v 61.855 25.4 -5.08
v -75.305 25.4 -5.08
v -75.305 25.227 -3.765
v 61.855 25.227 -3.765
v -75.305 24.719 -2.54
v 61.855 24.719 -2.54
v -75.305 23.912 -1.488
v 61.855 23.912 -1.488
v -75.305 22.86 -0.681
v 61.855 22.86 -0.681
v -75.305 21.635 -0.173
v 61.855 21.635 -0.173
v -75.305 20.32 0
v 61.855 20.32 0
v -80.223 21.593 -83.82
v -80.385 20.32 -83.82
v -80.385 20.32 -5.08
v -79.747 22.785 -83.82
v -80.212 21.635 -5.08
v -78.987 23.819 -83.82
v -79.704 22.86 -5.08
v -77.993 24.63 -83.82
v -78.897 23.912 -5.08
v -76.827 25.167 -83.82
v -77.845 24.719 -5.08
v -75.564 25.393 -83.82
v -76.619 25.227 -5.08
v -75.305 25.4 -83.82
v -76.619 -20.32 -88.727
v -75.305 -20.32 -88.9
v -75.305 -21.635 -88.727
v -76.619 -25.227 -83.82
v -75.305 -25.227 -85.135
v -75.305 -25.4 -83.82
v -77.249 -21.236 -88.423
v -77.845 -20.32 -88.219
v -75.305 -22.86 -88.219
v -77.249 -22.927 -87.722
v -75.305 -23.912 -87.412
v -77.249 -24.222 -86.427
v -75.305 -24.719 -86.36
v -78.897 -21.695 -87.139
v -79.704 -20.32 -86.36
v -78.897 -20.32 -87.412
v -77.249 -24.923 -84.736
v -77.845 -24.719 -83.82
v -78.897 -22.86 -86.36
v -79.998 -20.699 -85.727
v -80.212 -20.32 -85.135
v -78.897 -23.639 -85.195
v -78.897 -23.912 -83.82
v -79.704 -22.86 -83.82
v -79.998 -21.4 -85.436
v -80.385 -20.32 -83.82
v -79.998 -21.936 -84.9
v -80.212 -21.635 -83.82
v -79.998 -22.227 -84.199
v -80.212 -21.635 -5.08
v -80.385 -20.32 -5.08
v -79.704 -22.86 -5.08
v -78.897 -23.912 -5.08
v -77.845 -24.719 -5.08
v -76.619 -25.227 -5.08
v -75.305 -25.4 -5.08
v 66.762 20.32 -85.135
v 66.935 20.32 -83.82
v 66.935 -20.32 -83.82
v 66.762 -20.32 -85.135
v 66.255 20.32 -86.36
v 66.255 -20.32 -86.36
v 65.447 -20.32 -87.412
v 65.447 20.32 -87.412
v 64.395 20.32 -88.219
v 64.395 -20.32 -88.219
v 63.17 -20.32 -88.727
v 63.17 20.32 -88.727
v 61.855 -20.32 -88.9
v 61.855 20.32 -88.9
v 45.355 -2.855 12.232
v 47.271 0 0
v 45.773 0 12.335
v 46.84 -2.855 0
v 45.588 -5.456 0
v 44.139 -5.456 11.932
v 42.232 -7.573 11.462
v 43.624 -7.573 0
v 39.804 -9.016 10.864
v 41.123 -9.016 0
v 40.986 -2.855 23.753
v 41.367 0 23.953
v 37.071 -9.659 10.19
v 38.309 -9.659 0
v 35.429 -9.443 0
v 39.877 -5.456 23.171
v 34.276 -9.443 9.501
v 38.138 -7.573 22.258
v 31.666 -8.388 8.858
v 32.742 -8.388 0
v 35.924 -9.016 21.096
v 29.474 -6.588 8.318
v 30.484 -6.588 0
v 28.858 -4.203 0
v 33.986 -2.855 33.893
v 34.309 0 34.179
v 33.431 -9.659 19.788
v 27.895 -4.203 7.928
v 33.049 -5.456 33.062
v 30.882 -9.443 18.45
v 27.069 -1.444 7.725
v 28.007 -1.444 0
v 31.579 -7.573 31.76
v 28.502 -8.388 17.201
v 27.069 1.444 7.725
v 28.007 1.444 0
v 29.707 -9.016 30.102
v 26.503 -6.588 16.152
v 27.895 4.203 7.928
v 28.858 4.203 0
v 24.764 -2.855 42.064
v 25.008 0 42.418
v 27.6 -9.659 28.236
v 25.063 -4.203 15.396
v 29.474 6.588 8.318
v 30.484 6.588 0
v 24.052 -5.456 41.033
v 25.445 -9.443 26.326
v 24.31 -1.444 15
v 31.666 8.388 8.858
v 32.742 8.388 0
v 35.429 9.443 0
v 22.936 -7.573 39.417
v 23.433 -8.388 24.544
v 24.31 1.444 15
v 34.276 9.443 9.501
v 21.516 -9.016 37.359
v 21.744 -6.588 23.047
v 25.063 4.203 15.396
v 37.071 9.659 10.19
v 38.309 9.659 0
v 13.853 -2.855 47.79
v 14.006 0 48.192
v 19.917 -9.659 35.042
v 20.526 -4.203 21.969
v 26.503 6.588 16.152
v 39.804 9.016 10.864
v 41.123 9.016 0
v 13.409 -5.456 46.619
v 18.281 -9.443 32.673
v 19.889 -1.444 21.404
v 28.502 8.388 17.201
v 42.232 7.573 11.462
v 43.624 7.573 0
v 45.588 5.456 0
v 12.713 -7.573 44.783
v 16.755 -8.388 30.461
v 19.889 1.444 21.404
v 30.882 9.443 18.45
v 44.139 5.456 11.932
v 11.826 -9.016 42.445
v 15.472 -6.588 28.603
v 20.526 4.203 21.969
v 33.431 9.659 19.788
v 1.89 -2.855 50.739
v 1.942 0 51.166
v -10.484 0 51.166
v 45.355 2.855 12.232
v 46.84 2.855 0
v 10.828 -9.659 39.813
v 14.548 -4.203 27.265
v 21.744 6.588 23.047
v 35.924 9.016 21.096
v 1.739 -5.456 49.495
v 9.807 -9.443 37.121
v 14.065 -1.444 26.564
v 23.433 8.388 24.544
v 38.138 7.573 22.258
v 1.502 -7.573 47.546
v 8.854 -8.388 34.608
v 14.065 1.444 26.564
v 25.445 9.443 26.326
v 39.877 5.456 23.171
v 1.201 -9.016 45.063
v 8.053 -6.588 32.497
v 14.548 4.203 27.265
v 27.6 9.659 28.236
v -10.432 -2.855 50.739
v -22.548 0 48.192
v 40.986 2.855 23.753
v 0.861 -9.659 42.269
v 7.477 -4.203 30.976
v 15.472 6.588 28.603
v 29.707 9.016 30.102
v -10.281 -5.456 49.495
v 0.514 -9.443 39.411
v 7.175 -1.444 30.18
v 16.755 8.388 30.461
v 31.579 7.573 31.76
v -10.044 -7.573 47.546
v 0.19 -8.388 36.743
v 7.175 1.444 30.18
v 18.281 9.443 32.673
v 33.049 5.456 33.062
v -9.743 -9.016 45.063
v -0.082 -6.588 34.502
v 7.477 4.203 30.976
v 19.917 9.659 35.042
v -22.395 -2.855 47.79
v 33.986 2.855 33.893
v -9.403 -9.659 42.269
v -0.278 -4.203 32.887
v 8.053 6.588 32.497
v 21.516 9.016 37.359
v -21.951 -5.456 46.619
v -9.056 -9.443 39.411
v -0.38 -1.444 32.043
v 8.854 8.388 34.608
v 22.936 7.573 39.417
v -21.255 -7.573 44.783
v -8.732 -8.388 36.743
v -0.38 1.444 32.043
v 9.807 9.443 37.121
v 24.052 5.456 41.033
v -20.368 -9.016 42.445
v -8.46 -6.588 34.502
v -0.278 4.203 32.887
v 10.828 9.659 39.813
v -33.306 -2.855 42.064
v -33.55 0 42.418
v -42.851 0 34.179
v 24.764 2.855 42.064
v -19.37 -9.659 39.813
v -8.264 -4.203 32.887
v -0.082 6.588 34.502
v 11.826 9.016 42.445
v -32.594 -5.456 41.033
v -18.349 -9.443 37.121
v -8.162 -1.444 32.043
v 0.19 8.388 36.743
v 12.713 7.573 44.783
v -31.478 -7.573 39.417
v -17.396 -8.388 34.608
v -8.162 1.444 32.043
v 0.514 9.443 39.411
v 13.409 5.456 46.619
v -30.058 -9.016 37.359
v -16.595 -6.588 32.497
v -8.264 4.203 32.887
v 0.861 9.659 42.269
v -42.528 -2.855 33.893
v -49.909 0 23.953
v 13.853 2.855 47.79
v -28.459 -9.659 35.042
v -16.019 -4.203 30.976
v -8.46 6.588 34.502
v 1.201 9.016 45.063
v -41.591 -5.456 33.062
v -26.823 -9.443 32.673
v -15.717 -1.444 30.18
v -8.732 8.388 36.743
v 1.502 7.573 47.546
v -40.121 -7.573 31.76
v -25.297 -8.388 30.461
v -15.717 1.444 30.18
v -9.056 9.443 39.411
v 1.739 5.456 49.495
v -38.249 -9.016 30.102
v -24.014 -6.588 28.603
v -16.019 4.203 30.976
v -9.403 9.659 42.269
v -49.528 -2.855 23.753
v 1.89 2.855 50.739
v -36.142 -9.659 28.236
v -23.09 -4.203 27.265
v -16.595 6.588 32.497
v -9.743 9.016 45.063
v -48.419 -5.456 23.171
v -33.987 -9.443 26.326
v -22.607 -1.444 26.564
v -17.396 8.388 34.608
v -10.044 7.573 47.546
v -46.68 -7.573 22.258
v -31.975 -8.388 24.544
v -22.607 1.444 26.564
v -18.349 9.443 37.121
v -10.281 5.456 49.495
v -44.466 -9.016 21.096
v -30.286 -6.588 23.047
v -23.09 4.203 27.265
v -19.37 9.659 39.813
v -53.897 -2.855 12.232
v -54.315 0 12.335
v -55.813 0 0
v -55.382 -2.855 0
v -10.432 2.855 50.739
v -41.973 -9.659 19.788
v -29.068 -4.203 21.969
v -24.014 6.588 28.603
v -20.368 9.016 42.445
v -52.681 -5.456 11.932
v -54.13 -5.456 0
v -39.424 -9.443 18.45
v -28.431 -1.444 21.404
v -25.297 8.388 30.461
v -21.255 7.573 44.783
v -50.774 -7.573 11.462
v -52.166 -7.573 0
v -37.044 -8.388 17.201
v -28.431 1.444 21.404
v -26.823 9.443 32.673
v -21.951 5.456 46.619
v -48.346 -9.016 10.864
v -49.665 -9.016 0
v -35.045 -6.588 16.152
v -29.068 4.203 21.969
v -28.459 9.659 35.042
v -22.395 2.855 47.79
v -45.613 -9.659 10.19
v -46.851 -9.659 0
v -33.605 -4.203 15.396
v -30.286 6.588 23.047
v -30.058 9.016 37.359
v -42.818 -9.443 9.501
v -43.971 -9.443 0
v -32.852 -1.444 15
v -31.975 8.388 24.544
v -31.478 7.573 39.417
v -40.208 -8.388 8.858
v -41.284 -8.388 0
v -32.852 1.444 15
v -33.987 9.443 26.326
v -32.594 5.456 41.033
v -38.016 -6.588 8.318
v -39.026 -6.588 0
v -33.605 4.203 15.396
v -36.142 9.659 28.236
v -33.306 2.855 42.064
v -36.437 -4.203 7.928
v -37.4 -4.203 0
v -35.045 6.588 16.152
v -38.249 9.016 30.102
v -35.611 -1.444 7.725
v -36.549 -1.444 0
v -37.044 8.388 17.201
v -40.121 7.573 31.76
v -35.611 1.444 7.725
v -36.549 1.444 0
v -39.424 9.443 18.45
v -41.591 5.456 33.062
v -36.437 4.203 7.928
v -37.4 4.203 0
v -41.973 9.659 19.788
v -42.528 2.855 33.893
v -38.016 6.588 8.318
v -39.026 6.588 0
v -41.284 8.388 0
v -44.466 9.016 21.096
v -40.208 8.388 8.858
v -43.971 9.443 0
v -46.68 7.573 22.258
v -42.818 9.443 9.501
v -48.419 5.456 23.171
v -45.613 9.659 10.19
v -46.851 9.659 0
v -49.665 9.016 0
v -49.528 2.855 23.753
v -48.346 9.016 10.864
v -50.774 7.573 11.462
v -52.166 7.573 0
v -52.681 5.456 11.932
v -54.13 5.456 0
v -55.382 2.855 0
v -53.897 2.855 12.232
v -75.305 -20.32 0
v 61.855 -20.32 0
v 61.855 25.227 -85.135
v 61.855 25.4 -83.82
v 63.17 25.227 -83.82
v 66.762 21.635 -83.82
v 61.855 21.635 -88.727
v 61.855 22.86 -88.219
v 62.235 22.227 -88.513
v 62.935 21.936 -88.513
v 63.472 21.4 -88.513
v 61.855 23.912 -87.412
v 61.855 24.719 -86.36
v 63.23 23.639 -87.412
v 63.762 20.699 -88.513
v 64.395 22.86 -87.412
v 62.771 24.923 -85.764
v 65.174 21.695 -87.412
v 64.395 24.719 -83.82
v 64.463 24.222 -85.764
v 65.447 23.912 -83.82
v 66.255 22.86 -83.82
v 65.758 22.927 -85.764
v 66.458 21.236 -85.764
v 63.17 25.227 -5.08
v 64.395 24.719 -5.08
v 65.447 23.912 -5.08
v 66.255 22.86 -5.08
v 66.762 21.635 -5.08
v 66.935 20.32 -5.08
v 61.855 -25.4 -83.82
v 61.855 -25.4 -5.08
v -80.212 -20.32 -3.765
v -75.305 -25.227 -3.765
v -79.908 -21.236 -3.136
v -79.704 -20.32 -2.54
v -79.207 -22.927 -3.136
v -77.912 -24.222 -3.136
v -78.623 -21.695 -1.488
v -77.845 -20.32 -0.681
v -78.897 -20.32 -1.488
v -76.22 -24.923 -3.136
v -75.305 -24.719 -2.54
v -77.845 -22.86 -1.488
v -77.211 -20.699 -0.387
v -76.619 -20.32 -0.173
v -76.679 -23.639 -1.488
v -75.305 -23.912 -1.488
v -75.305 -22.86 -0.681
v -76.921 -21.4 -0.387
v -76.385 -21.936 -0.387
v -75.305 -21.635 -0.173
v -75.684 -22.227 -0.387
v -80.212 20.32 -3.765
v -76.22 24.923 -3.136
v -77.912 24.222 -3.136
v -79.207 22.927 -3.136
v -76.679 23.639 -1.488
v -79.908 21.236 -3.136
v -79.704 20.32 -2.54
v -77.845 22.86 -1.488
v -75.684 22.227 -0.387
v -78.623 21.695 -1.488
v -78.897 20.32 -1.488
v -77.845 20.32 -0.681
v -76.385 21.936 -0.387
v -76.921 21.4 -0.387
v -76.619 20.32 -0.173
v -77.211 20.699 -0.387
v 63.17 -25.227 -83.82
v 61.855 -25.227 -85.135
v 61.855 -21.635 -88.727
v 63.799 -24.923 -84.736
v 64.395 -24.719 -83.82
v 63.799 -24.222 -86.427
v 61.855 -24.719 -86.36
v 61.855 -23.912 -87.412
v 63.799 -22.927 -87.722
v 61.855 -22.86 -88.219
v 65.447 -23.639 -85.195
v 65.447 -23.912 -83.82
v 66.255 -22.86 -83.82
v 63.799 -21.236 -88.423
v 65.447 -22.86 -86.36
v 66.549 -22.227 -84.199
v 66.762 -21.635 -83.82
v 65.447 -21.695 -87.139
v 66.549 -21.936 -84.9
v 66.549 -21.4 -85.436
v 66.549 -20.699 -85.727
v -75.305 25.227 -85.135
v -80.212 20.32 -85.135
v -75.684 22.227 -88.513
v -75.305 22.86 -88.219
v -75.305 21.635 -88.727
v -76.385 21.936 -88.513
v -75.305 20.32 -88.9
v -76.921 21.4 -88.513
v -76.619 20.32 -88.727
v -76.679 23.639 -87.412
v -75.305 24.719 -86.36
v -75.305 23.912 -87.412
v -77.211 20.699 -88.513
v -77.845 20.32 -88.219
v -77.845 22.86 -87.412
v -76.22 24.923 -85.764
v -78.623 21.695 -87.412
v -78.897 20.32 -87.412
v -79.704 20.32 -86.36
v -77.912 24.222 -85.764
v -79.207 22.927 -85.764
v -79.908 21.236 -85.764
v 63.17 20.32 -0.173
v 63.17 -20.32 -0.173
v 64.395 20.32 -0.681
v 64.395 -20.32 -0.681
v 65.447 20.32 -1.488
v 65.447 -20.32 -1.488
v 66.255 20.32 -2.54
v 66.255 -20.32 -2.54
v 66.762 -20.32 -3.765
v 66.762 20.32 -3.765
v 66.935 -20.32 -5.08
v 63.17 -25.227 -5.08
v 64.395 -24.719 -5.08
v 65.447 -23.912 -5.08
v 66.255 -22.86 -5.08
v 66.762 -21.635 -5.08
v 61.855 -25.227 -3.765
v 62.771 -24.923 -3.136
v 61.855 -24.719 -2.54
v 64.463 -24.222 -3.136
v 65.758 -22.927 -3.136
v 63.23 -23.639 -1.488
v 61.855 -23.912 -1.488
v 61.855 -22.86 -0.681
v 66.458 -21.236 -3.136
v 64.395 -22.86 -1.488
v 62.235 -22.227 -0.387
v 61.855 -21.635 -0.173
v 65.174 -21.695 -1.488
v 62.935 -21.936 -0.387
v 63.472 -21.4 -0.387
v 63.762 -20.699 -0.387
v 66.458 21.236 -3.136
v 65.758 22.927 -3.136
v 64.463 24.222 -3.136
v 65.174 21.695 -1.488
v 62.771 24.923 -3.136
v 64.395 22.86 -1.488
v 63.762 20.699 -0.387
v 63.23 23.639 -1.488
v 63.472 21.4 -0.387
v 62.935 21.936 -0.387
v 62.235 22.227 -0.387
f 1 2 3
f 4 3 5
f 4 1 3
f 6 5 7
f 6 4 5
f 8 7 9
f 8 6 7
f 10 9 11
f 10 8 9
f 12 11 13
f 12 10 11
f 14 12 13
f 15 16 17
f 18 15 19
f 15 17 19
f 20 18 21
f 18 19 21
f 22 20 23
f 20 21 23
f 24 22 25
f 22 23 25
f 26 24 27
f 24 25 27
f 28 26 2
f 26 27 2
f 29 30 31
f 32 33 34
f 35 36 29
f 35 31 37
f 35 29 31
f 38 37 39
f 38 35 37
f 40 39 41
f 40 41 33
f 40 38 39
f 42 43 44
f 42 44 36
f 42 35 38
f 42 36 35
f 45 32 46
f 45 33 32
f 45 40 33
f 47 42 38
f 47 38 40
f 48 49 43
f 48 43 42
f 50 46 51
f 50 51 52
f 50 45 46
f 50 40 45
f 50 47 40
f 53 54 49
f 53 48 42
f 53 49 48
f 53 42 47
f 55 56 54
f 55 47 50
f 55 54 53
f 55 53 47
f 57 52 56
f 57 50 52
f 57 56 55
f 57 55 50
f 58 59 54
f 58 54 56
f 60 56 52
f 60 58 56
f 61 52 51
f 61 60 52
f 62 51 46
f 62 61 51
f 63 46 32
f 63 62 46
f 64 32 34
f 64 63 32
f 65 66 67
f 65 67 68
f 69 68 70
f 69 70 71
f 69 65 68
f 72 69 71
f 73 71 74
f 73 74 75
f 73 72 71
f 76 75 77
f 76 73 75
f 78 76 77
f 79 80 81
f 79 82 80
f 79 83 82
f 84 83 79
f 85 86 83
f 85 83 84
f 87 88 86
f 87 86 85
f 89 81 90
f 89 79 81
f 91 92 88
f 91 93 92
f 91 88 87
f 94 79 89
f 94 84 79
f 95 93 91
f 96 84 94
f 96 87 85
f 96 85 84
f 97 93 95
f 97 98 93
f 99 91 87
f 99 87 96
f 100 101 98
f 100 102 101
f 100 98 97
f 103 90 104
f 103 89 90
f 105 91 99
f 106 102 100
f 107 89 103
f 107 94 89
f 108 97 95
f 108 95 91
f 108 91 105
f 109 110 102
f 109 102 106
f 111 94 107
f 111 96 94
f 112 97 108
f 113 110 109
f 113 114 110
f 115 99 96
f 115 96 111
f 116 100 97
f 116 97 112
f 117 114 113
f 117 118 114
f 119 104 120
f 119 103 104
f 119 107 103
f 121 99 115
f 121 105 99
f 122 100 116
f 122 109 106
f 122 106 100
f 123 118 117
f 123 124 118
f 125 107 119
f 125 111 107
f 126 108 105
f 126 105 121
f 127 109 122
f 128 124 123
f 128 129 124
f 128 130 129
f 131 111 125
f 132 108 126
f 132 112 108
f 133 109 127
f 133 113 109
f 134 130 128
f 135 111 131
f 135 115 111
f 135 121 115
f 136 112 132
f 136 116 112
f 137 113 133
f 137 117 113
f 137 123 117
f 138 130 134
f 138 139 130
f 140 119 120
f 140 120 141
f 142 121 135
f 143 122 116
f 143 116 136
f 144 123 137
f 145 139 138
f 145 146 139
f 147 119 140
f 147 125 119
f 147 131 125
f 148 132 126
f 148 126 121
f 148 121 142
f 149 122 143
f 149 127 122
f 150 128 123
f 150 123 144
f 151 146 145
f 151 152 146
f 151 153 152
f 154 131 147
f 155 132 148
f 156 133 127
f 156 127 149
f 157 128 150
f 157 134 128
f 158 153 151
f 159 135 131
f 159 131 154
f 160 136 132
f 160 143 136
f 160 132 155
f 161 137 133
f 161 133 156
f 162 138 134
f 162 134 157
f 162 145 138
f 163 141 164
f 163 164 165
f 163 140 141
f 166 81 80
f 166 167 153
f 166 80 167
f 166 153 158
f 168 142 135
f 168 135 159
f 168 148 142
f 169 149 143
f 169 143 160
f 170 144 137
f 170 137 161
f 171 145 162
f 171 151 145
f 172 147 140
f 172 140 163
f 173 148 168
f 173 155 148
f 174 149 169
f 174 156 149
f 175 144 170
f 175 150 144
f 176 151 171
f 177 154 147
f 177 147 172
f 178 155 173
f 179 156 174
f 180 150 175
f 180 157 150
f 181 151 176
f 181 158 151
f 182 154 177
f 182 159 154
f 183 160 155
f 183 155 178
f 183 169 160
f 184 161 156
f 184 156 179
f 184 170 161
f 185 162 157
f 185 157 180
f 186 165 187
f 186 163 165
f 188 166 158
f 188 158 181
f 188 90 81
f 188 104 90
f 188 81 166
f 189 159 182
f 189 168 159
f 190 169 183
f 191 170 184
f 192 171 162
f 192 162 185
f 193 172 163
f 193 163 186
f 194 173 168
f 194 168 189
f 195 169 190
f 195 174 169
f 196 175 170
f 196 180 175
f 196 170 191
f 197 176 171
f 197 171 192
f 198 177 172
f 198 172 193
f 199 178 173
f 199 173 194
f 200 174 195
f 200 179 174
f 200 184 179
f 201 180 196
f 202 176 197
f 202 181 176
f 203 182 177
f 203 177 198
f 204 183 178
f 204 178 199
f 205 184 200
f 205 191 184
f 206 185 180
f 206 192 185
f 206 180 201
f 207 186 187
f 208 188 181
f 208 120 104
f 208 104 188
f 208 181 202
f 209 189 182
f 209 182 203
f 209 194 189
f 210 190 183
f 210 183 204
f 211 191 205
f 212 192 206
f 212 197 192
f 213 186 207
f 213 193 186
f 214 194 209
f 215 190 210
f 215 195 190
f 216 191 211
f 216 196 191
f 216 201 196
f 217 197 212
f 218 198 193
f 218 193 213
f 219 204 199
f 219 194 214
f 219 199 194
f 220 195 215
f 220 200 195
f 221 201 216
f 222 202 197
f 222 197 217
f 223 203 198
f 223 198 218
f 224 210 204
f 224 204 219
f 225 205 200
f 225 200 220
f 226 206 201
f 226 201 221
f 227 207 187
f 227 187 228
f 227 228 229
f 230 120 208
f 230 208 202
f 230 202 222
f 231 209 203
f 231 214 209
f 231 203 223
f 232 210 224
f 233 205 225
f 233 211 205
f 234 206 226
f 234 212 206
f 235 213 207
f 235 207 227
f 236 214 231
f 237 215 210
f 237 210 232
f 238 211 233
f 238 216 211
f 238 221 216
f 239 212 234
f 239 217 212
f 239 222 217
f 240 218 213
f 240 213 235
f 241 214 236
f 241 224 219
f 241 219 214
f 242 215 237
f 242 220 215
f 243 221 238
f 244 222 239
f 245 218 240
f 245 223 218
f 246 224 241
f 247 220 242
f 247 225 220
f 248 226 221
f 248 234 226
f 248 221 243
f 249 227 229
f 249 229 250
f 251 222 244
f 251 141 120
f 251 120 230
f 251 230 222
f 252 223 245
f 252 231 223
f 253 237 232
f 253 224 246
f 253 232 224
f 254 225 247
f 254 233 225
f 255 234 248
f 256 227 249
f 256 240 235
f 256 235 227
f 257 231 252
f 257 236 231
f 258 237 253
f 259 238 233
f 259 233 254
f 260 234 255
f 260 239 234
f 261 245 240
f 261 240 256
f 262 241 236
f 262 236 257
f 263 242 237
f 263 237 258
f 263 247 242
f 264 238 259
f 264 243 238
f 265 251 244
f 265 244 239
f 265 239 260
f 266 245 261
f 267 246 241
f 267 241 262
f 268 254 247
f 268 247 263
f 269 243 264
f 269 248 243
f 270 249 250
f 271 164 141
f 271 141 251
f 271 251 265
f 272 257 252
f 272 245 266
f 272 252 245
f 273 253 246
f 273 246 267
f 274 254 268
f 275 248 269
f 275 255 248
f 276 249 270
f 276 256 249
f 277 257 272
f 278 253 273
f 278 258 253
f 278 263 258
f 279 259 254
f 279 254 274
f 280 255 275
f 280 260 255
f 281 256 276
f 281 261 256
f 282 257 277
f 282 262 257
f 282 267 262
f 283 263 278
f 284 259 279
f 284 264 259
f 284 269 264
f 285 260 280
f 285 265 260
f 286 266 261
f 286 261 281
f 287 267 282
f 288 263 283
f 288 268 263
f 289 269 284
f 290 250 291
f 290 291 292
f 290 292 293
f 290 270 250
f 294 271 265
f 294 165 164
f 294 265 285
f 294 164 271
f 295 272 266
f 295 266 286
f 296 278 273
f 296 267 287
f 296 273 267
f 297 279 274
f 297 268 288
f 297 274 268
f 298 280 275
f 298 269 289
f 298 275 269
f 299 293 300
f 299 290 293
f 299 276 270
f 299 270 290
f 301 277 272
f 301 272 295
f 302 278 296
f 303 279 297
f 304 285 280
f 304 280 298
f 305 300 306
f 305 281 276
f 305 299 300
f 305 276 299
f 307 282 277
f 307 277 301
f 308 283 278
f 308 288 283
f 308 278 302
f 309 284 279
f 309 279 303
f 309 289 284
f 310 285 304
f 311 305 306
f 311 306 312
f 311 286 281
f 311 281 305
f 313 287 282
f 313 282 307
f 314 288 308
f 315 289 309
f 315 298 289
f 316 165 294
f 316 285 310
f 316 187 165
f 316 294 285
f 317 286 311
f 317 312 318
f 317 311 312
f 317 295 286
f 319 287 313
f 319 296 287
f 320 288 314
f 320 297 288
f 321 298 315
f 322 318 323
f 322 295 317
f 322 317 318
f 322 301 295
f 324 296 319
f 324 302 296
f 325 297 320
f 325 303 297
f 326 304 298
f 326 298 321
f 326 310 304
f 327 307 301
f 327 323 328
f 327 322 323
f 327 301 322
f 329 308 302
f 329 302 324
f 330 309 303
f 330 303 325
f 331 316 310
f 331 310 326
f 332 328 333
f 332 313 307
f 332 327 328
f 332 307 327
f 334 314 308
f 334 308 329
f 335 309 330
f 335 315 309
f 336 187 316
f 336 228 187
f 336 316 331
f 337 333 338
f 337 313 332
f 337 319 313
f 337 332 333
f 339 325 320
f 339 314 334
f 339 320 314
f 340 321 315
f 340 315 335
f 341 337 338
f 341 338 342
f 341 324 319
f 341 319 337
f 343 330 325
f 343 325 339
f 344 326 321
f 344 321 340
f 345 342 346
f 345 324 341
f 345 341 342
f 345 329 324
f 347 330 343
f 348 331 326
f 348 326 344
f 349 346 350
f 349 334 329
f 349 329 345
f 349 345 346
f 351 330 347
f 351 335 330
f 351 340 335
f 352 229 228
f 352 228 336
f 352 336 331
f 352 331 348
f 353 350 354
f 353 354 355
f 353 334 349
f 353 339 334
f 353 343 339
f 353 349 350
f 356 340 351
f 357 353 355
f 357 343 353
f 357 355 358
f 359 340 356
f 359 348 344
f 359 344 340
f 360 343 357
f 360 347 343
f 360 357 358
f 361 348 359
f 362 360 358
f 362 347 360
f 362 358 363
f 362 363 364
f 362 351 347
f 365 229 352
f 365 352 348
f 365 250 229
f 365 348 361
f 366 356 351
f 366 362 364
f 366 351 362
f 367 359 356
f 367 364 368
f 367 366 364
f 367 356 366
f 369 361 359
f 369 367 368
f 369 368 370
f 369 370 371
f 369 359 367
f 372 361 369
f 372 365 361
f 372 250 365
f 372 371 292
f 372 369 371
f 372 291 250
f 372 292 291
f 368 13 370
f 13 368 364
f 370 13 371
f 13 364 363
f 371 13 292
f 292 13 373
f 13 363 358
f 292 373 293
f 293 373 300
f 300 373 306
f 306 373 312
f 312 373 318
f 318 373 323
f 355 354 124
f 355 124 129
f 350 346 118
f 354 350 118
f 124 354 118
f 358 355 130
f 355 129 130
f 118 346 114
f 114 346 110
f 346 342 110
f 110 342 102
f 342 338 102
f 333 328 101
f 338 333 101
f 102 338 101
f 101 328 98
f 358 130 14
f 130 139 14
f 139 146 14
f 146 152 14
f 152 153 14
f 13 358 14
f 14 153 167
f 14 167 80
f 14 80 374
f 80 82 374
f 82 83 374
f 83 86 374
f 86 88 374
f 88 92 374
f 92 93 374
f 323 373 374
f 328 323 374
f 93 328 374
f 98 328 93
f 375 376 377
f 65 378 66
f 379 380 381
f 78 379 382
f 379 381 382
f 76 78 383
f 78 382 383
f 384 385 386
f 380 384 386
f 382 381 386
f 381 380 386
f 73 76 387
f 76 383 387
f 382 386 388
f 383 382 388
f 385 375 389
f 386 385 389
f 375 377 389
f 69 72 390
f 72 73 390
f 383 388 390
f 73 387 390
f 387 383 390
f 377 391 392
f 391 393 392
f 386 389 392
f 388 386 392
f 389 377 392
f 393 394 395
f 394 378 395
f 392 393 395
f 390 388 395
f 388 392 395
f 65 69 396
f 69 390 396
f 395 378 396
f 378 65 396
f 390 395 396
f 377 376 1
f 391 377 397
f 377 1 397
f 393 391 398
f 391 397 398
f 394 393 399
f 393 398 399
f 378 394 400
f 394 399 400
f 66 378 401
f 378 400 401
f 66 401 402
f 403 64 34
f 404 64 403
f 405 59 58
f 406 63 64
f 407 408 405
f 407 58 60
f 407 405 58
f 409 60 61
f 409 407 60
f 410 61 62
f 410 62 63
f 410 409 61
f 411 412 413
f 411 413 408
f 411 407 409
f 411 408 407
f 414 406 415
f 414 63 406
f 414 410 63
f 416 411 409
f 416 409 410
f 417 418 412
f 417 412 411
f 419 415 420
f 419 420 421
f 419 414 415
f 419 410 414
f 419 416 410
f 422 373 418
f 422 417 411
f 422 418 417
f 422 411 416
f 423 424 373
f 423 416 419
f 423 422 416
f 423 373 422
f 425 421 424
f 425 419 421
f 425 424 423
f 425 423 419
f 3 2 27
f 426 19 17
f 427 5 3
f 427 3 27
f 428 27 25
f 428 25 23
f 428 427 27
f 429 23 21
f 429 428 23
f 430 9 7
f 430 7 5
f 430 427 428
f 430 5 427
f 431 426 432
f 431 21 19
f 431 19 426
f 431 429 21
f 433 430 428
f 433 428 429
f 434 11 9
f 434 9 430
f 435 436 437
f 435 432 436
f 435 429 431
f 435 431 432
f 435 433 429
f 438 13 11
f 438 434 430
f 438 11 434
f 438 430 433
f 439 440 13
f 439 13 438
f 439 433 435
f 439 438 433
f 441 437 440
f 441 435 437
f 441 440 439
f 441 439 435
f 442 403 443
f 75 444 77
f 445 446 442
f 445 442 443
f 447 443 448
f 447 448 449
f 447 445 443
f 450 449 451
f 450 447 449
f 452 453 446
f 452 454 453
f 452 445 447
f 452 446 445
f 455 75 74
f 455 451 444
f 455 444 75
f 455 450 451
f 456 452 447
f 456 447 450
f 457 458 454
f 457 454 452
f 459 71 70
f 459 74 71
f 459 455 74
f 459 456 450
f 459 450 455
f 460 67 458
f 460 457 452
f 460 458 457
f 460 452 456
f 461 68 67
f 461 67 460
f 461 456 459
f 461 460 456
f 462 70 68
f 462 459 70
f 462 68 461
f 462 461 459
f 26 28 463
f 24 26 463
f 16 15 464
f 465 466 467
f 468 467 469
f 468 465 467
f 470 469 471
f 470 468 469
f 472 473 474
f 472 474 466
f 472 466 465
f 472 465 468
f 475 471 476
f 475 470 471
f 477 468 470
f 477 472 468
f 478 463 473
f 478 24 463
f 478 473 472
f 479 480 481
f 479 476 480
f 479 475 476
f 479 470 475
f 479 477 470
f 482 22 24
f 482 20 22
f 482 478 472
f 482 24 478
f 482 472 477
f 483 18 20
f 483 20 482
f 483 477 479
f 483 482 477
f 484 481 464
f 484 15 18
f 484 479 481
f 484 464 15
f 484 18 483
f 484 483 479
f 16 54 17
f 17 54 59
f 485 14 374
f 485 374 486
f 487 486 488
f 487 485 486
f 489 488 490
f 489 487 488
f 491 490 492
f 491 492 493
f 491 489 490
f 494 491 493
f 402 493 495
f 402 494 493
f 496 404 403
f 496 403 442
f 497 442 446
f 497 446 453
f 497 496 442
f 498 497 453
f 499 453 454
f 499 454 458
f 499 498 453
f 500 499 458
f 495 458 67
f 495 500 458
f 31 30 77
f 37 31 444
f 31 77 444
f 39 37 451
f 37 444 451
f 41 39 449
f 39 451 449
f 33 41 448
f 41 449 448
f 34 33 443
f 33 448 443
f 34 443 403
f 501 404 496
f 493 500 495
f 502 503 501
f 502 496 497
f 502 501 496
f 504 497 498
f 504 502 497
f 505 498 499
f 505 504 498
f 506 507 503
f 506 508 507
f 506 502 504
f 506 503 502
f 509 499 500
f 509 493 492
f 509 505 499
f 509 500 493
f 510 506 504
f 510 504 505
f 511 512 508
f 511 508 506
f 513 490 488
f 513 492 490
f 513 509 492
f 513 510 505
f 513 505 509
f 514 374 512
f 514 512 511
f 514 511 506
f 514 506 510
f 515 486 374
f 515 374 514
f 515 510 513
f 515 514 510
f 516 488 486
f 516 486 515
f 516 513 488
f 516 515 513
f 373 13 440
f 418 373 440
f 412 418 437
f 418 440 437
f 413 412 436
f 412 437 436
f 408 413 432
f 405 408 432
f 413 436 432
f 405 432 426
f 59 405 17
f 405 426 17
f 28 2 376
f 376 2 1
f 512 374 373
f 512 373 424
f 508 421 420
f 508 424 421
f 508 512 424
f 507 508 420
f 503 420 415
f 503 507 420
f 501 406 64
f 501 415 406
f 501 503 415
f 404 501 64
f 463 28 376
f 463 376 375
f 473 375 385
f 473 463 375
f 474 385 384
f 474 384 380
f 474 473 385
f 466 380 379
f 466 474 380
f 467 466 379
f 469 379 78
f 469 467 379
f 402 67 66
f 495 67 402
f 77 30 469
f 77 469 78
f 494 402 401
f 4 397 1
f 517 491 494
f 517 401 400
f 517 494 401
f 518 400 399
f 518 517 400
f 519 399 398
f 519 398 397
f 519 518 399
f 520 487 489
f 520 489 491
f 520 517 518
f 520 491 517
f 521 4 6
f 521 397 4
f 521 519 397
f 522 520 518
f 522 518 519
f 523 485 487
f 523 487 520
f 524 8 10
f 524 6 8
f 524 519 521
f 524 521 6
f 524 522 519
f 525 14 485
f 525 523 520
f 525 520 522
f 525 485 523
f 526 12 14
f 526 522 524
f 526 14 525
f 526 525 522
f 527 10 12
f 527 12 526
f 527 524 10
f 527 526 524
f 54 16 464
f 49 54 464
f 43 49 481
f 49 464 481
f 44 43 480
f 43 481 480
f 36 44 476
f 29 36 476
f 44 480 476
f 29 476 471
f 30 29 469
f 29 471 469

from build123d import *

# Parameters (mm, degrees)
F1_R         = 9.6860400986
F3_W         = 147.32
F3_H         = 88.9
F4_DEPTH     = 25.4
F5_R         = 5.08
F6_T1_DEPTH  = 40.64
F6_S5_W      = 5.08
F6_S5_H      = 5.08
F6_T6_DEPTH  = 5.08
F6_S11_W     = 5.08
F6_S11_H     = 5.08
F6_T12_DEPTH = 5.08
F7_T1_DEPTH  = 40.64
F7_S5_W      = 5.08
F7_S5_H      = 5.08
F7_T6_DEPTH  = 5.08
F7_S11_W     = 5.08
F7_S11_H     = 5.08
F7_T12_DEPTH = 5.08
F8_T1_DEPTH  = 40.64
F8_T3_DEPTH  = 137.16
F8_S7_W      = 5.08
F8_S7_H      = 5.08
F8_T8_DEPTH  = 5.08
F8_S13_W     = 5.08
F8_S13_H     = 5.08
F8_T14_DEPTH = 5.08
F8_T18_ANGLE = 90
F8_T20_ANGLE = 90


# Not quite as in the source:
# - a fillet or chamfer that OpenCascade refuses, or shapes differently, is made with other operations: its cross-section is extruded or revolved along the edge and cut away or added


with BuildPart() as f2:
    # F2: sweep along a path in F0
    with BuildLine(Plane.XZ) as f2_path:
        ThreePointArc((37.5847704709, 0), (-4.2709950358, 41.8557655066), (-46.1267605424, 0))
    # F1 (on Top) → F2 (sweep)
    with BuildSketch(Plane.XY):
        with Locations((37.5847704709, 0)):
            Circle(F1_R)
    sweep(path=f2_path.line)

    # F3 (on Front) → F4 (join, symmetric)
    with BuildSketch(Plane.XZ):
        with Locations((-6.7246720757, -44.45)):
            Rectangle(F3_W, F3_H)
    extrude(amount=F4_DEPTH, both=True)

    # F5
    f5_edges = [f2.edges().sort_by_distance(p)[0] for p in [
        (-80.384672, -25.4, -44.45),
        (66.935328, -25.4, -44.45),
        (66.935328, 25.4, -44.45),
        (-80.384672, 25.4, -44.45),
        (-6.724672, 25.4, 0),
        (-6.724672, -25.4, -88.9),
        (-6.724672, -25.4, 0),
    ]]
    fillet(f5_edges, radius=F5_R)

    # F6: fillet of radius 5.08 on 1 edges, made by hand

    # F6_s2 → F6_t1 (cut)
    with BuildSketch(Plane.XZ.offset(-20.32)):
        with BuildLine():
            ThreePointArc((61.8553279243, 0), (65.4474303727, -1.4878975516), (66.9353279243, -5.08))
            Line((66.9353279243, -5.08), (66.9353279243, 0))
            Line((66.9353279243, 0), (61.8553279243, 0))
        make_face()
    extrude(amount=F6_T1_DEPTH, mode=Mode.SUBTRACT)


with BuildPart() as f6_tool4:
    # F6_s5 → F6_t6 (new body)
    with BuildSketch(Plane.XY.offset(-5.08)):
        with Locations((64.3953279243, -22.86)):
            Rectangle(F6_S5_W, F6_S5_H)
    extrude(amount=F6_T6_DEPTH)

    # F6_s7 → F6_t8 (revolve, cut)
    with BuildSketch(Plane(origin=(61.8553279243, -20.32, -5.08), x_dir=(-0.7071067812, 0.7071067812, 0), z_dir=(0.7071067812, 0.7071067812, 0))):
        with BuildLine():
            ThreePointArc((0, -5.08), (5.08, 0), (0, 5.08))
            Line((0, 5.08), (0, -5.08))
        make_face()
    revolve(axis=Axis((61.8553279243, -20.32, -5.08), (0, 0, 1)), mode=Mode.SUBTRACT)


with BuildPart() as f2_1:
    add(f2.part)

    # F6_t3: cut F6_tool4
    add(f6_tool4.part, mode=Mode.SUBTRACT)


with BuildPart() as f6_tool10:
    # F6_s11 → F6_t12 (new body)
    with BuildSketch(Plane.XY.offset(-5.08)):
        with Locations((64.3953279243, 22.86)):
            Rectangle(F6_S11_W, F6_S11_H)
    extrude(amount=F6_T12_DEPTH)

    # F6_s13 → F6_t14 (revolve, cut)
    with BuildSketch(Plane(origin=(61.8553279243, 20.32, -5.08), x_dir=(-0.7071067812, -0.7071067812, 0), z_dir=(-0.7071067812, 0.7071067812, 0))):
        with BuildLine():
            ThreePointArc((0, -5.08), (5.08, 0), (0, 5.08))
            Line((0, 5.08), (0, -5.08))
        make_face()
    revolve(axis=Axis((61.8553279243, 20.32, -5.08), (0, 0, 1)), mode=Mode.SUBTRACT)


with BuildPart() as f2_2:
    add(f2_1.part)

    # F6_t9: cut F6_tool10
    add(f6_tool10.part, mode=Mode.SUBTRACT)

    # F7: fillet of radius 5.08 on 1 edges, made by hand

    # F7_s2 → F7_t1 (cut)
    with BuildSketch(Plane.XZ.offset(-20.32)):
        with BuildLine():
            ThreePointArc((-75.3046720757, 0), (-78.8967745241, -1.4878975516), (-80.3846720757, -5.08))
            Line((-80.3846720757, -5.08), (-80.3846720757, 0))
            Line((-80.3846720757, 0), (-75.3046720757, 0))
        make_face()
    extrude(amount=F7_T1_DEPTH, mode=Mode.SUBTRACT)


with BuildPart() as f7_tool4:
    # F7_s5 → F7_t6 (new body)
    with BuildSketch(Plane.XY.offset(-5.08)):
        with Locations((-77.8446720757, 22.86)):
            Rectangle(F7_S5_W, F7_S5_H)
    extrude(amount=F7_T6_DEPTH)

    # F7_s7 → F7_t8 (revolve, cut)
    with BuildSketch(Plane(origin=(-75.3046720757, 20.32, -5.08), x_dir=(0.7071067812, -0.7071067812, 0), z_dir=(-0.7071067812, -0.7071067812, 0))):
        with BuildLine():
            ThreePointArc((0, -5.08), (5.08, 0), (0, 5.08))
            Line((0, 5.08), (0, -5.08))
        make_face()
    revolve(axis=Axis((-75.3046720757, 20.32, -5.08), (0, 0, 1)), mode=Mode.SUBTRACT)


with BuildPart() as f2_3:
    add(f2_2.part)

    # F7_t3: cut F7_tool4
    add(f7_tool4.part, mode=Mode.SUBTRACT)


with BuildPart() as f7_tool10:
    # F7_s11 → F7_t12 (new body)
    with BuildSketch(Plane.XY.offset(-5.08)):
        with Locations((-77.8446720757, -22.86)):
            Rectangle(F7_S11_W, F7_S11_H)
    extrude(amount=F7_T12_DEPTH)

    # F7_s13 → F7_t14 (revolve, cut)
    with BuildSketch(Plane(origin=(-75.3046720757, -20.32, -5.08), x_dir=(0.7071067812, 0.7071067812, 0), z_dir=(0.7071067812, -0.7071067812, 0))):
        with BuildLine():
            ThreePointArc((0, -5.08), (5.08, 0), (0, 5.08))
            Line((0, 5.08), (0, -5.08))
        make_face()
    revolve(axis=Axis((-75.3046720757, -20.32, -5.08), (0, 0, 1)), mode=Mode.SUBTRACT)


with BuildPart() as f2_4:
    add(f2_3.part)

    # F7_t9: cut F7_tool10
    add(f7_tool10.part, mode=Mode.SUBTRACT)

    # F8: fillet of radius 5.08 on 1 edges, made by hand

    # F8_s2 → F8_t1 (cut)
    with BuildSketch(Plane.XZ.offset(-20.32)):
        with BuildLine():
            ThreePointArc((-80.3846720757, -83.82), (-78.8967745241, -87.4121024484), (-75.3046720757, -88.9))
            Line((-75.3046720757, -88.9), (-80.3846720757, -88.9))
            Line((-80.3846720757, -88.9), (-80.3846720757, -83.82))
        make_face()
        with BuildLine():
            ThreePointArc((66.9353279243, -83.82), (65.4474303727, -87.4121024484), (61.8553279243, -88.9))
            Line((61.8553279243, -88.9), (66.9353279243, -88.9))
            Line((66.9353279243, -88.9), (66.9353279243, -83.82))
        make_face()
    extrude(amount=F8_T1_DEPTH, mode=Mode.SUBTRACT)

    # F8_s4 → F8_t3 (cut)
    with BuildSketch(Plane.YZ.offset(-75.3046720757)):
        with BuildLine():
            ThreePointArc((25.4, -83.82), (23.9121024484, -87.4121024484), (20.32, -88.9))
            Line((20.32, -88.9), (25.4, -88.9))
            Line((25.4, -88.9), (25.4, -83.82))
        make_face()
    extrude(amount=F8_T3_DEPTH, mode=Mode.SUBTRACT)


with BuildPart() as f8_tool6:
    # F8_s7 → F8_t8 (new body)
    with BuildSketch(Plane.YZ.offset(-75.3046720757)):
        with Locations((-22.86, -86.36)):
            Rectangle(F8_S7_W, F8_S7_H)
    extrude(amount=-F8_T8_DEPTH)

    # F8_s9 → F8_t10 (revolve, cut)
    with BuildSketch(Plane(origin=(-75.3046720757, -20.32, -83.82), x_dir=(0, 0.7071067812, 0.7071067812), z_dir=(0, -0.7071067812, 0.7071067812))):
        with BuildLine():
            ThreePointArc((0, -5.08), (5.08, 0), (0, 5.08))
            Line((0, 5.08), (0, -5.08))
        make_face()
    revolve(axis=Axis((-75.3046720757, -20.32, -83.82), (-1, 0, 0)), mode=Mode.SUBTRACT)


with BuildPart() as f2_5:
    add(f2_4.part)

    # F8_t5: cut F8_tool6
    add(f8_tool6.part, mode=Mode.SUBTRACT)


with BuildPart() as f8_tool12:
    # F8_s13 → F8_t14 (new body)
    with BuildSketch(Plane.YZ.offset(61.8553279243)):
        with Locations((-22.86, -86.36)):
            Rectangle(F8_S13_W, F8_S13_H)
    extrude(amount=F8_T14_DEPTH)

    # F8_s15 → F8_t16 (revolve, cut)
    with BuildSketch(Plane(origin=(61.8553279243, -20.32, -83.82), x_dir=(0, 0.7071067812, 0.7071067812), z_dir=(0, 0.7071067812, -0.7071067812))):
        with BuildLine():
            ThreePointArc((0, -5.08), (5.08, 0), (0, 5.08))
            Line((0, 5.08), (0, -5.08))
        make_face()
    revolve(axis=Axis((61.8553279243, -20.32, -83.82), (1, 0, 0)), mode=Mode.SUBTRACT)


with BuildPart() as f2_6:
    add(f2_5.part)

    # F8_t11: cut F8_tool12
    add(f8_tool12.part, mode=Mode.SUBTRACT)

    # F8_s17 → F8_t18 (revolve, cut)
    with BuildSketch(Plane.YZ.offset(-75.3046720757)):
        with BuildLine():
            ThreePointArc((20.32, -88.9), (23.9121024484, -87.4121024484), (25.4, -83.82))
            Line((25.4, -83.82), (25.4, -88.9))
            Line((25.4, -88.9), (20.32, -88.9))
        make_face()
    revolve(axis=Axis((-75.3046720757, 20.32, -88.9), (0, 0, 1)), revolution_arc=F8_T18_ANGLE, mode=Mode.SUBTRACT)

    # F8_s19 → F8_t20 (revolve, cut)
    with BuildSketch(Plane.YZ.offset(61.8553279243)):
        with BuildLine():
            ThreePointArc((20.32, -88.9), (23.9121024484, -87.4121024484), (25.4, -83.82))
            Line((25.4, -83.82), (25.4, -88.9))
            Line((25.4, -88.9), (20.32, -88.9))
        make_face()
    revolve(axis=Axis((61.8553279243, 20.32, -88.9), (0, 0, -1)), revolution_arc=F8_T20_ANGLE, mode=Mode.SUBTRACT)


solid = f2_6.part
